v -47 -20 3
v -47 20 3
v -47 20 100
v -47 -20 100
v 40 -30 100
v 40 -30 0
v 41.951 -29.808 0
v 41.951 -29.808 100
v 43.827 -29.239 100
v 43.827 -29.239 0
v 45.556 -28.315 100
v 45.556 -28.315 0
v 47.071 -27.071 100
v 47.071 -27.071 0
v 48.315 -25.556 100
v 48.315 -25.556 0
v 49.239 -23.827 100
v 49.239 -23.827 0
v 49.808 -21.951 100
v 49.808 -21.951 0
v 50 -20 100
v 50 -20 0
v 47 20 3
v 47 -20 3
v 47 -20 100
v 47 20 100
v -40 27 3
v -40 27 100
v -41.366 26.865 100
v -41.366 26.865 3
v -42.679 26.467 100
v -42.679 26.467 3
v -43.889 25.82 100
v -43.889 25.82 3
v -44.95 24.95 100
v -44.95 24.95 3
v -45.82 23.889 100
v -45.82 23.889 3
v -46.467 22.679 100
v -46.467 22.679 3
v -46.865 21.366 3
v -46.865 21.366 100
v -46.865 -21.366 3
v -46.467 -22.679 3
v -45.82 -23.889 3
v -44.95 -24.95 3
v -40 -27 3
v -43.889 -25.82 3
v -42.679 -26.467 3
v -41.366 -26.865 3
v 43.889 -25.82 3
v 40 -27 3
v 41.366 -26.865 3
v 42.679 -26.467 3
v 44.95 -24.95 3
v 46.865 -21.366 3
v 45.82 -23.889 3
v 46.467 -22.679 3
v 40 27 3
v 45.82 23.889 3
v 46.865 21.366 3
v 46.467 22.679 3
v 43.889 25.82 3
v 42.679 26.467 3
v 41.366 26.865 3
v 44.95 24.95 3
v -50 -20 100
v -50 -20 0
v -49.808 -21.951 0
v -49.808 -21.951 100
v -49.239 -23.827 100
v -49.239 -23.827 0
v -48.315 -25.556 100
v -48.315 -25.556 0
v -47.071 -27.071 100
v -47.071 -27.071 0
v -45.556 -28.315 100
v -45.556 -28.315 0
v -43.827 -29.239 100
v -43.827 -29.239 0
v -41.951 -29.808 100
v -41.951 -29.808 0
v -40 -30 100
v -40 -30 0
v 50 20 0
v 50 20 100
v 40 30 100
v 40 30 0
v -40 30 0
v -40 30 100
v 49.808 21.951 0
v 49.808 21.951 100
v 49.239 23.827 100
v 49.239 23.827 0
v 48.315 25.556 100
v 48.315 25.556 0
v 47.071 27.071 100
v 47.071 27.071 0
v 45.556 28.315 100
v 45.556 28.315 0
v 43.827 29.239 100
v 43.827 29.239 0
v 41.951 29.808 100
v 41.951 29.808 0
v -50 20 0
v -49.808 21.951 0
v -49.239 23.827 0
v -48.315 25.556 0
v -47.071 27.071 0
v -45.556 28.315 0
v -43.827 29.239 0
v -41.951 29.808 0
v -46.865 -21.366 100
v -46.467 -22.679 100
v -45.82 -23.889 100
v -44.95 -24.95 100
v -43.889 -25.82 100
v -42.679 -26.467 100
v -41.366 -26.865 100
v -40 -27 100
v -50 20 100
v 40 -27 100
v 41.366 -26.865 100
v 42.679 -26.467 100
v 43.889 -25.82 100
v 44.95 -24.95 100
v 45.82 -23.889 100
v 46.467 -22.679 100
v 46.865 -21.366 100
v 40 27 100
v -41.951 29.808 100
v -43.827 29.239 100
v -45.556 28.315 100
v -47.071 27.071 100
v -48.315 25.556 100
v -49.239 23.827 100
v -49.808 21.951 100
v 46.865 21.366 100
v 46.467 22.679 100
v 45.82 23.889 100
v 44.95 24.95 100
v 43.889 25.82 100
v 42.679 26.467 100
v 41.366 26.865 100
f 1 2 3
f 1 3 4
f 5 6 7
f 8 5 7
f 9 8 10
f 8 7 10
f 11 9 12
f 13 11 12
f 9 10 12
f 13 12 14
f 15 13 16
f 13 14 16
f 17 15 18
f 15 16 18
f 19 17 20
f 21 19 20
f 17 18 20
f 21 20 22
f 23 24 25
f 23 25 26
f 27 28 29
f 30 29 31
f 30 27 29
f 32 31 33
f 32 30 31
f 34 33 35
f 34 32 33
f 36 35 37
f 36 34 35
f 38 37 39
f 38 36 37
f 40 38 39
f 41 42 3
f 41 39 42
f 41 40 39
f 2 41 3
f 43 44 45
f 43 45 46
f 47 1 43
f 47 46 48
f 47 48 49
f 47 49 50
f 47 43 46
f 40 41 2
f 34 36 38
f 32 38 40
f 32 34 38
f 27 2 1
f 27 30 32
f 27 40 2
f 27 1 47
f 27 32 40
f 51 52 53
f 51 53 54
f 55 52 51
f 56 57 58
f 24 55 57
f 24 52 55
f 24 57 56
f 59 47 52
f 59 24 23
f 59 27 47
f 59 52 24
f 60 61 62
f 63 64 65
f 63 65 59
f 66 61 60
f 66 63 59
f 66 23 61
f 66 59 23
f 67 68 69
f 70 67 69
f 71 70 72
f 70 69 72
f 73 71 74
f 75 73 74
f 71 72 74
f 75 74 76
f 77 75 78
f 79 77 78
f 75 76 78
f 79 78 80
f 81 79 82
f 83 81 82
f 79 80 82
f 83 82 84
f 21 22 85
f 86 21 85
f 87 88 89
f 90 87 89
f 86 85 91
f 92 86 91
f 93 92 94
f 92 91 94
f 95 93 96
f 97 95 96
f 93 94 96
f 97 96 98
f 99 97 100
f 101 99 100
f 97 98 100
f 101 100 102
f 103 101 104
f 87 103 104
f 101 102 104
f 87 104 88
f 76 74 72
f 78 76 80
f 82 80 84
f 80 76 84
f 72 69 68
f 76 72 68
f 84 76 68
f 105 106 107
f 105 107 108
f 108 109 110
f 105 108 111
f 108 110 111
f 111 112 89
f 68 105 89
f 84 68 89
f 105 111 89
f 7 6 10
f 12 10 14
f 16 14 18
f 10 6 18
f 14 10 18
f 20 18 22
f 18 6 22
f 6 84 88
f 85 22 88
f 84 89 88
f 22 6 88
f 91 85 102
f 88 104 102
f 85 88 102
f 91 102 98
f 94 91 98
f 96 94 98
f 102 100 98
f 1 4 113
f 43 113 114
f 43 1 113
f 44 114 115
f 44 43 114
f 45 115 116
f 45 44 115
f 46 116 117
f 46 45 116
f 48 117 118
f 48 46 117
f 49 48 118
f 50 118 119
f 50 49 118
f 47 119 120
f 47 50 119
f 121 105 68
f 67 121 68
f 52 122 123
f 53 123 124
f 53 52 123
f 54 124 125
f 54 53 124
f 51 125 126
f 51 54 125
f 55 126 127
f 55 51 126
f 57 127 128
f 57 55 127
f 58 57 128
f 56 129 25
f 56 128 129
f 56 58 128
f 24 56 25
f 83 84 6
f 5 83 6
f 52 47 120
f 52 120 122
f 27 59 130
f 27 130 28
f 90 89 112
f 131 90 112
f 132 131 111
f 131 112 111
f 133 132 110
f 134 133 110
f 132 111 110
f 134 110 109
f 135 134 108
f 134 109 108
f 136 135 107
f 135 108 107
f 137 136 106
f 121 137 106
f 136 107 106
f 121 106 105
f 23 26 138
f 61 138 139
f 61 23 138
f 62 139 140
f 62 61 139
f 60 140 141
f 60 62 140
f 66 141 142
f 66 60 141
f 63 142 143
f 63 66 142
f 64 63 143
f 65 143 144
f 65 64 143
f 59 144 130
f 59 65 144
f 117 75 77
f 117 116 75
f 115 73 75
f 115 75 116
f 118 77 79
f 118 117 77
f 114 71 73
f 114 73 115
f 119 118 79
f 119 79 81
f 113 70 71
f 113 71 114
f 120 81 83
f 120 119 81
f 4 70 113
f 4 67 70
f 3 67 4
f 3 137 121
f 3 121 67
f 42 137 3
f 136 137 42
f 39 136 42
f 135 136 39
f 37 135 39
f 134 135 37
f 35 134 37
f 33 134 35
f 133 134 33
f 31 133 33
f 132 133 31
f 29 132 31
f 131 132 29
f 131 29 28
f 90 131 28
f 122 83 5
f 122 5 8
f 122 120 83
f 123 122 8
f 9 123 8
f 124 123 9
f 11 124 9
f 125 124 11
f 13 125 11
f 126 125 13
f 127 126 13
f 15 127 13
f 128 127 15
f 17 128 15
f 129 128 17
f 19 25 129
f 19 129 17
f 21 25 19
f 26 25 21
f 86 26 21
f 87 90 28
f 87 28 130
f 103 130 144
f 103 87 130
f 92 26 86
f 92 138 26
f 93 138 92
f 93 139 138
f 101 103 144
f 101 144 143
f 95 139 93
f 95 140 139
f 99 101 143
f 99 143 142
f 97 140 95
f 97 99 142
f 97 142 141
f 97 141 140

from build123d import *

# Parameters (mm, degrees)
F1_DEPTH = 3
F3_DEPTH = 100
F4_DEPTH = 100


with BuildPart() as f1:
    # F0 (on Top) → F1 (new body)
    with BuildSketch(Plane.XY):
        with BuildLine():
            ThreePointArc((50, 20), (47.071068, 27.071068), (40, 30))
            Line((40, 30), (-40, 30))
            ThreePointArc((-40, 30), (-47.071068, 27.071068), (-50, 20))
            Line((-50, 20), (-50, -20))
            ThreePointArc((-50, -20), (-47.071068, -27.071068), (-40, -30))
            Line((-40, -30), (40, -30))
            ThreePointArc((40, -30), (47.071068, -27.071068), (50, -20))
            Line((50, -20), (50, 20))
        make_face()
    extrude(amount=F1_DEPTH)

    # F0 (on Top) → F3 (join)
    with BuildSketch(Plane.XY):
        with BuildLine():
            ThreePointArc((50, 20), (47.071068, 27.071068), (40, 30))
            Line((40, 30), (-40, 30))
            ThreePointArc((-40, 30), (-47.071068, 27.071068), (-50, 20))
            Line((-50, 20), (-50, -20))
            ThreePointArc((-50, -20), (-47.071068, -27.071068), (-40, -30))
            Line((-40, -30), (40, -30))
            ThreePointArc((40, -30), (47.071068, -27.071068), (50, -20))
            Line((50, -20), (50, 20))
        make_face()
    extrude(amount=F3_DEPTH)

    # F2 (on face) → F4 (cut)
    with BuildSketch(Plane.XY.offset(3)):
        with BuildLine():
            Line((-47, 20), (-47, -20))
            ThreePointArc((-47, -20), (-44.949747, -24.949747), (-40, -27))
            Line((-40, -27), (40, -27))
            ThreePointArc((40, -27), (44.949747, -24.949747), (47, -20))
            Line((47, -20), (47, 20))
            ThreePointArc((47, 20), (44.949747, 24.949747), (40, 27))
            Line((40, 27), (-40, 27))
            ThreePointArc((-40, 27), (-44.949747, 24.949747), (-47, 20))
        make_face()
    extrude(amount=F4_DEPTH, mode=Mode.SUBTRACT)


solid = f1.part
